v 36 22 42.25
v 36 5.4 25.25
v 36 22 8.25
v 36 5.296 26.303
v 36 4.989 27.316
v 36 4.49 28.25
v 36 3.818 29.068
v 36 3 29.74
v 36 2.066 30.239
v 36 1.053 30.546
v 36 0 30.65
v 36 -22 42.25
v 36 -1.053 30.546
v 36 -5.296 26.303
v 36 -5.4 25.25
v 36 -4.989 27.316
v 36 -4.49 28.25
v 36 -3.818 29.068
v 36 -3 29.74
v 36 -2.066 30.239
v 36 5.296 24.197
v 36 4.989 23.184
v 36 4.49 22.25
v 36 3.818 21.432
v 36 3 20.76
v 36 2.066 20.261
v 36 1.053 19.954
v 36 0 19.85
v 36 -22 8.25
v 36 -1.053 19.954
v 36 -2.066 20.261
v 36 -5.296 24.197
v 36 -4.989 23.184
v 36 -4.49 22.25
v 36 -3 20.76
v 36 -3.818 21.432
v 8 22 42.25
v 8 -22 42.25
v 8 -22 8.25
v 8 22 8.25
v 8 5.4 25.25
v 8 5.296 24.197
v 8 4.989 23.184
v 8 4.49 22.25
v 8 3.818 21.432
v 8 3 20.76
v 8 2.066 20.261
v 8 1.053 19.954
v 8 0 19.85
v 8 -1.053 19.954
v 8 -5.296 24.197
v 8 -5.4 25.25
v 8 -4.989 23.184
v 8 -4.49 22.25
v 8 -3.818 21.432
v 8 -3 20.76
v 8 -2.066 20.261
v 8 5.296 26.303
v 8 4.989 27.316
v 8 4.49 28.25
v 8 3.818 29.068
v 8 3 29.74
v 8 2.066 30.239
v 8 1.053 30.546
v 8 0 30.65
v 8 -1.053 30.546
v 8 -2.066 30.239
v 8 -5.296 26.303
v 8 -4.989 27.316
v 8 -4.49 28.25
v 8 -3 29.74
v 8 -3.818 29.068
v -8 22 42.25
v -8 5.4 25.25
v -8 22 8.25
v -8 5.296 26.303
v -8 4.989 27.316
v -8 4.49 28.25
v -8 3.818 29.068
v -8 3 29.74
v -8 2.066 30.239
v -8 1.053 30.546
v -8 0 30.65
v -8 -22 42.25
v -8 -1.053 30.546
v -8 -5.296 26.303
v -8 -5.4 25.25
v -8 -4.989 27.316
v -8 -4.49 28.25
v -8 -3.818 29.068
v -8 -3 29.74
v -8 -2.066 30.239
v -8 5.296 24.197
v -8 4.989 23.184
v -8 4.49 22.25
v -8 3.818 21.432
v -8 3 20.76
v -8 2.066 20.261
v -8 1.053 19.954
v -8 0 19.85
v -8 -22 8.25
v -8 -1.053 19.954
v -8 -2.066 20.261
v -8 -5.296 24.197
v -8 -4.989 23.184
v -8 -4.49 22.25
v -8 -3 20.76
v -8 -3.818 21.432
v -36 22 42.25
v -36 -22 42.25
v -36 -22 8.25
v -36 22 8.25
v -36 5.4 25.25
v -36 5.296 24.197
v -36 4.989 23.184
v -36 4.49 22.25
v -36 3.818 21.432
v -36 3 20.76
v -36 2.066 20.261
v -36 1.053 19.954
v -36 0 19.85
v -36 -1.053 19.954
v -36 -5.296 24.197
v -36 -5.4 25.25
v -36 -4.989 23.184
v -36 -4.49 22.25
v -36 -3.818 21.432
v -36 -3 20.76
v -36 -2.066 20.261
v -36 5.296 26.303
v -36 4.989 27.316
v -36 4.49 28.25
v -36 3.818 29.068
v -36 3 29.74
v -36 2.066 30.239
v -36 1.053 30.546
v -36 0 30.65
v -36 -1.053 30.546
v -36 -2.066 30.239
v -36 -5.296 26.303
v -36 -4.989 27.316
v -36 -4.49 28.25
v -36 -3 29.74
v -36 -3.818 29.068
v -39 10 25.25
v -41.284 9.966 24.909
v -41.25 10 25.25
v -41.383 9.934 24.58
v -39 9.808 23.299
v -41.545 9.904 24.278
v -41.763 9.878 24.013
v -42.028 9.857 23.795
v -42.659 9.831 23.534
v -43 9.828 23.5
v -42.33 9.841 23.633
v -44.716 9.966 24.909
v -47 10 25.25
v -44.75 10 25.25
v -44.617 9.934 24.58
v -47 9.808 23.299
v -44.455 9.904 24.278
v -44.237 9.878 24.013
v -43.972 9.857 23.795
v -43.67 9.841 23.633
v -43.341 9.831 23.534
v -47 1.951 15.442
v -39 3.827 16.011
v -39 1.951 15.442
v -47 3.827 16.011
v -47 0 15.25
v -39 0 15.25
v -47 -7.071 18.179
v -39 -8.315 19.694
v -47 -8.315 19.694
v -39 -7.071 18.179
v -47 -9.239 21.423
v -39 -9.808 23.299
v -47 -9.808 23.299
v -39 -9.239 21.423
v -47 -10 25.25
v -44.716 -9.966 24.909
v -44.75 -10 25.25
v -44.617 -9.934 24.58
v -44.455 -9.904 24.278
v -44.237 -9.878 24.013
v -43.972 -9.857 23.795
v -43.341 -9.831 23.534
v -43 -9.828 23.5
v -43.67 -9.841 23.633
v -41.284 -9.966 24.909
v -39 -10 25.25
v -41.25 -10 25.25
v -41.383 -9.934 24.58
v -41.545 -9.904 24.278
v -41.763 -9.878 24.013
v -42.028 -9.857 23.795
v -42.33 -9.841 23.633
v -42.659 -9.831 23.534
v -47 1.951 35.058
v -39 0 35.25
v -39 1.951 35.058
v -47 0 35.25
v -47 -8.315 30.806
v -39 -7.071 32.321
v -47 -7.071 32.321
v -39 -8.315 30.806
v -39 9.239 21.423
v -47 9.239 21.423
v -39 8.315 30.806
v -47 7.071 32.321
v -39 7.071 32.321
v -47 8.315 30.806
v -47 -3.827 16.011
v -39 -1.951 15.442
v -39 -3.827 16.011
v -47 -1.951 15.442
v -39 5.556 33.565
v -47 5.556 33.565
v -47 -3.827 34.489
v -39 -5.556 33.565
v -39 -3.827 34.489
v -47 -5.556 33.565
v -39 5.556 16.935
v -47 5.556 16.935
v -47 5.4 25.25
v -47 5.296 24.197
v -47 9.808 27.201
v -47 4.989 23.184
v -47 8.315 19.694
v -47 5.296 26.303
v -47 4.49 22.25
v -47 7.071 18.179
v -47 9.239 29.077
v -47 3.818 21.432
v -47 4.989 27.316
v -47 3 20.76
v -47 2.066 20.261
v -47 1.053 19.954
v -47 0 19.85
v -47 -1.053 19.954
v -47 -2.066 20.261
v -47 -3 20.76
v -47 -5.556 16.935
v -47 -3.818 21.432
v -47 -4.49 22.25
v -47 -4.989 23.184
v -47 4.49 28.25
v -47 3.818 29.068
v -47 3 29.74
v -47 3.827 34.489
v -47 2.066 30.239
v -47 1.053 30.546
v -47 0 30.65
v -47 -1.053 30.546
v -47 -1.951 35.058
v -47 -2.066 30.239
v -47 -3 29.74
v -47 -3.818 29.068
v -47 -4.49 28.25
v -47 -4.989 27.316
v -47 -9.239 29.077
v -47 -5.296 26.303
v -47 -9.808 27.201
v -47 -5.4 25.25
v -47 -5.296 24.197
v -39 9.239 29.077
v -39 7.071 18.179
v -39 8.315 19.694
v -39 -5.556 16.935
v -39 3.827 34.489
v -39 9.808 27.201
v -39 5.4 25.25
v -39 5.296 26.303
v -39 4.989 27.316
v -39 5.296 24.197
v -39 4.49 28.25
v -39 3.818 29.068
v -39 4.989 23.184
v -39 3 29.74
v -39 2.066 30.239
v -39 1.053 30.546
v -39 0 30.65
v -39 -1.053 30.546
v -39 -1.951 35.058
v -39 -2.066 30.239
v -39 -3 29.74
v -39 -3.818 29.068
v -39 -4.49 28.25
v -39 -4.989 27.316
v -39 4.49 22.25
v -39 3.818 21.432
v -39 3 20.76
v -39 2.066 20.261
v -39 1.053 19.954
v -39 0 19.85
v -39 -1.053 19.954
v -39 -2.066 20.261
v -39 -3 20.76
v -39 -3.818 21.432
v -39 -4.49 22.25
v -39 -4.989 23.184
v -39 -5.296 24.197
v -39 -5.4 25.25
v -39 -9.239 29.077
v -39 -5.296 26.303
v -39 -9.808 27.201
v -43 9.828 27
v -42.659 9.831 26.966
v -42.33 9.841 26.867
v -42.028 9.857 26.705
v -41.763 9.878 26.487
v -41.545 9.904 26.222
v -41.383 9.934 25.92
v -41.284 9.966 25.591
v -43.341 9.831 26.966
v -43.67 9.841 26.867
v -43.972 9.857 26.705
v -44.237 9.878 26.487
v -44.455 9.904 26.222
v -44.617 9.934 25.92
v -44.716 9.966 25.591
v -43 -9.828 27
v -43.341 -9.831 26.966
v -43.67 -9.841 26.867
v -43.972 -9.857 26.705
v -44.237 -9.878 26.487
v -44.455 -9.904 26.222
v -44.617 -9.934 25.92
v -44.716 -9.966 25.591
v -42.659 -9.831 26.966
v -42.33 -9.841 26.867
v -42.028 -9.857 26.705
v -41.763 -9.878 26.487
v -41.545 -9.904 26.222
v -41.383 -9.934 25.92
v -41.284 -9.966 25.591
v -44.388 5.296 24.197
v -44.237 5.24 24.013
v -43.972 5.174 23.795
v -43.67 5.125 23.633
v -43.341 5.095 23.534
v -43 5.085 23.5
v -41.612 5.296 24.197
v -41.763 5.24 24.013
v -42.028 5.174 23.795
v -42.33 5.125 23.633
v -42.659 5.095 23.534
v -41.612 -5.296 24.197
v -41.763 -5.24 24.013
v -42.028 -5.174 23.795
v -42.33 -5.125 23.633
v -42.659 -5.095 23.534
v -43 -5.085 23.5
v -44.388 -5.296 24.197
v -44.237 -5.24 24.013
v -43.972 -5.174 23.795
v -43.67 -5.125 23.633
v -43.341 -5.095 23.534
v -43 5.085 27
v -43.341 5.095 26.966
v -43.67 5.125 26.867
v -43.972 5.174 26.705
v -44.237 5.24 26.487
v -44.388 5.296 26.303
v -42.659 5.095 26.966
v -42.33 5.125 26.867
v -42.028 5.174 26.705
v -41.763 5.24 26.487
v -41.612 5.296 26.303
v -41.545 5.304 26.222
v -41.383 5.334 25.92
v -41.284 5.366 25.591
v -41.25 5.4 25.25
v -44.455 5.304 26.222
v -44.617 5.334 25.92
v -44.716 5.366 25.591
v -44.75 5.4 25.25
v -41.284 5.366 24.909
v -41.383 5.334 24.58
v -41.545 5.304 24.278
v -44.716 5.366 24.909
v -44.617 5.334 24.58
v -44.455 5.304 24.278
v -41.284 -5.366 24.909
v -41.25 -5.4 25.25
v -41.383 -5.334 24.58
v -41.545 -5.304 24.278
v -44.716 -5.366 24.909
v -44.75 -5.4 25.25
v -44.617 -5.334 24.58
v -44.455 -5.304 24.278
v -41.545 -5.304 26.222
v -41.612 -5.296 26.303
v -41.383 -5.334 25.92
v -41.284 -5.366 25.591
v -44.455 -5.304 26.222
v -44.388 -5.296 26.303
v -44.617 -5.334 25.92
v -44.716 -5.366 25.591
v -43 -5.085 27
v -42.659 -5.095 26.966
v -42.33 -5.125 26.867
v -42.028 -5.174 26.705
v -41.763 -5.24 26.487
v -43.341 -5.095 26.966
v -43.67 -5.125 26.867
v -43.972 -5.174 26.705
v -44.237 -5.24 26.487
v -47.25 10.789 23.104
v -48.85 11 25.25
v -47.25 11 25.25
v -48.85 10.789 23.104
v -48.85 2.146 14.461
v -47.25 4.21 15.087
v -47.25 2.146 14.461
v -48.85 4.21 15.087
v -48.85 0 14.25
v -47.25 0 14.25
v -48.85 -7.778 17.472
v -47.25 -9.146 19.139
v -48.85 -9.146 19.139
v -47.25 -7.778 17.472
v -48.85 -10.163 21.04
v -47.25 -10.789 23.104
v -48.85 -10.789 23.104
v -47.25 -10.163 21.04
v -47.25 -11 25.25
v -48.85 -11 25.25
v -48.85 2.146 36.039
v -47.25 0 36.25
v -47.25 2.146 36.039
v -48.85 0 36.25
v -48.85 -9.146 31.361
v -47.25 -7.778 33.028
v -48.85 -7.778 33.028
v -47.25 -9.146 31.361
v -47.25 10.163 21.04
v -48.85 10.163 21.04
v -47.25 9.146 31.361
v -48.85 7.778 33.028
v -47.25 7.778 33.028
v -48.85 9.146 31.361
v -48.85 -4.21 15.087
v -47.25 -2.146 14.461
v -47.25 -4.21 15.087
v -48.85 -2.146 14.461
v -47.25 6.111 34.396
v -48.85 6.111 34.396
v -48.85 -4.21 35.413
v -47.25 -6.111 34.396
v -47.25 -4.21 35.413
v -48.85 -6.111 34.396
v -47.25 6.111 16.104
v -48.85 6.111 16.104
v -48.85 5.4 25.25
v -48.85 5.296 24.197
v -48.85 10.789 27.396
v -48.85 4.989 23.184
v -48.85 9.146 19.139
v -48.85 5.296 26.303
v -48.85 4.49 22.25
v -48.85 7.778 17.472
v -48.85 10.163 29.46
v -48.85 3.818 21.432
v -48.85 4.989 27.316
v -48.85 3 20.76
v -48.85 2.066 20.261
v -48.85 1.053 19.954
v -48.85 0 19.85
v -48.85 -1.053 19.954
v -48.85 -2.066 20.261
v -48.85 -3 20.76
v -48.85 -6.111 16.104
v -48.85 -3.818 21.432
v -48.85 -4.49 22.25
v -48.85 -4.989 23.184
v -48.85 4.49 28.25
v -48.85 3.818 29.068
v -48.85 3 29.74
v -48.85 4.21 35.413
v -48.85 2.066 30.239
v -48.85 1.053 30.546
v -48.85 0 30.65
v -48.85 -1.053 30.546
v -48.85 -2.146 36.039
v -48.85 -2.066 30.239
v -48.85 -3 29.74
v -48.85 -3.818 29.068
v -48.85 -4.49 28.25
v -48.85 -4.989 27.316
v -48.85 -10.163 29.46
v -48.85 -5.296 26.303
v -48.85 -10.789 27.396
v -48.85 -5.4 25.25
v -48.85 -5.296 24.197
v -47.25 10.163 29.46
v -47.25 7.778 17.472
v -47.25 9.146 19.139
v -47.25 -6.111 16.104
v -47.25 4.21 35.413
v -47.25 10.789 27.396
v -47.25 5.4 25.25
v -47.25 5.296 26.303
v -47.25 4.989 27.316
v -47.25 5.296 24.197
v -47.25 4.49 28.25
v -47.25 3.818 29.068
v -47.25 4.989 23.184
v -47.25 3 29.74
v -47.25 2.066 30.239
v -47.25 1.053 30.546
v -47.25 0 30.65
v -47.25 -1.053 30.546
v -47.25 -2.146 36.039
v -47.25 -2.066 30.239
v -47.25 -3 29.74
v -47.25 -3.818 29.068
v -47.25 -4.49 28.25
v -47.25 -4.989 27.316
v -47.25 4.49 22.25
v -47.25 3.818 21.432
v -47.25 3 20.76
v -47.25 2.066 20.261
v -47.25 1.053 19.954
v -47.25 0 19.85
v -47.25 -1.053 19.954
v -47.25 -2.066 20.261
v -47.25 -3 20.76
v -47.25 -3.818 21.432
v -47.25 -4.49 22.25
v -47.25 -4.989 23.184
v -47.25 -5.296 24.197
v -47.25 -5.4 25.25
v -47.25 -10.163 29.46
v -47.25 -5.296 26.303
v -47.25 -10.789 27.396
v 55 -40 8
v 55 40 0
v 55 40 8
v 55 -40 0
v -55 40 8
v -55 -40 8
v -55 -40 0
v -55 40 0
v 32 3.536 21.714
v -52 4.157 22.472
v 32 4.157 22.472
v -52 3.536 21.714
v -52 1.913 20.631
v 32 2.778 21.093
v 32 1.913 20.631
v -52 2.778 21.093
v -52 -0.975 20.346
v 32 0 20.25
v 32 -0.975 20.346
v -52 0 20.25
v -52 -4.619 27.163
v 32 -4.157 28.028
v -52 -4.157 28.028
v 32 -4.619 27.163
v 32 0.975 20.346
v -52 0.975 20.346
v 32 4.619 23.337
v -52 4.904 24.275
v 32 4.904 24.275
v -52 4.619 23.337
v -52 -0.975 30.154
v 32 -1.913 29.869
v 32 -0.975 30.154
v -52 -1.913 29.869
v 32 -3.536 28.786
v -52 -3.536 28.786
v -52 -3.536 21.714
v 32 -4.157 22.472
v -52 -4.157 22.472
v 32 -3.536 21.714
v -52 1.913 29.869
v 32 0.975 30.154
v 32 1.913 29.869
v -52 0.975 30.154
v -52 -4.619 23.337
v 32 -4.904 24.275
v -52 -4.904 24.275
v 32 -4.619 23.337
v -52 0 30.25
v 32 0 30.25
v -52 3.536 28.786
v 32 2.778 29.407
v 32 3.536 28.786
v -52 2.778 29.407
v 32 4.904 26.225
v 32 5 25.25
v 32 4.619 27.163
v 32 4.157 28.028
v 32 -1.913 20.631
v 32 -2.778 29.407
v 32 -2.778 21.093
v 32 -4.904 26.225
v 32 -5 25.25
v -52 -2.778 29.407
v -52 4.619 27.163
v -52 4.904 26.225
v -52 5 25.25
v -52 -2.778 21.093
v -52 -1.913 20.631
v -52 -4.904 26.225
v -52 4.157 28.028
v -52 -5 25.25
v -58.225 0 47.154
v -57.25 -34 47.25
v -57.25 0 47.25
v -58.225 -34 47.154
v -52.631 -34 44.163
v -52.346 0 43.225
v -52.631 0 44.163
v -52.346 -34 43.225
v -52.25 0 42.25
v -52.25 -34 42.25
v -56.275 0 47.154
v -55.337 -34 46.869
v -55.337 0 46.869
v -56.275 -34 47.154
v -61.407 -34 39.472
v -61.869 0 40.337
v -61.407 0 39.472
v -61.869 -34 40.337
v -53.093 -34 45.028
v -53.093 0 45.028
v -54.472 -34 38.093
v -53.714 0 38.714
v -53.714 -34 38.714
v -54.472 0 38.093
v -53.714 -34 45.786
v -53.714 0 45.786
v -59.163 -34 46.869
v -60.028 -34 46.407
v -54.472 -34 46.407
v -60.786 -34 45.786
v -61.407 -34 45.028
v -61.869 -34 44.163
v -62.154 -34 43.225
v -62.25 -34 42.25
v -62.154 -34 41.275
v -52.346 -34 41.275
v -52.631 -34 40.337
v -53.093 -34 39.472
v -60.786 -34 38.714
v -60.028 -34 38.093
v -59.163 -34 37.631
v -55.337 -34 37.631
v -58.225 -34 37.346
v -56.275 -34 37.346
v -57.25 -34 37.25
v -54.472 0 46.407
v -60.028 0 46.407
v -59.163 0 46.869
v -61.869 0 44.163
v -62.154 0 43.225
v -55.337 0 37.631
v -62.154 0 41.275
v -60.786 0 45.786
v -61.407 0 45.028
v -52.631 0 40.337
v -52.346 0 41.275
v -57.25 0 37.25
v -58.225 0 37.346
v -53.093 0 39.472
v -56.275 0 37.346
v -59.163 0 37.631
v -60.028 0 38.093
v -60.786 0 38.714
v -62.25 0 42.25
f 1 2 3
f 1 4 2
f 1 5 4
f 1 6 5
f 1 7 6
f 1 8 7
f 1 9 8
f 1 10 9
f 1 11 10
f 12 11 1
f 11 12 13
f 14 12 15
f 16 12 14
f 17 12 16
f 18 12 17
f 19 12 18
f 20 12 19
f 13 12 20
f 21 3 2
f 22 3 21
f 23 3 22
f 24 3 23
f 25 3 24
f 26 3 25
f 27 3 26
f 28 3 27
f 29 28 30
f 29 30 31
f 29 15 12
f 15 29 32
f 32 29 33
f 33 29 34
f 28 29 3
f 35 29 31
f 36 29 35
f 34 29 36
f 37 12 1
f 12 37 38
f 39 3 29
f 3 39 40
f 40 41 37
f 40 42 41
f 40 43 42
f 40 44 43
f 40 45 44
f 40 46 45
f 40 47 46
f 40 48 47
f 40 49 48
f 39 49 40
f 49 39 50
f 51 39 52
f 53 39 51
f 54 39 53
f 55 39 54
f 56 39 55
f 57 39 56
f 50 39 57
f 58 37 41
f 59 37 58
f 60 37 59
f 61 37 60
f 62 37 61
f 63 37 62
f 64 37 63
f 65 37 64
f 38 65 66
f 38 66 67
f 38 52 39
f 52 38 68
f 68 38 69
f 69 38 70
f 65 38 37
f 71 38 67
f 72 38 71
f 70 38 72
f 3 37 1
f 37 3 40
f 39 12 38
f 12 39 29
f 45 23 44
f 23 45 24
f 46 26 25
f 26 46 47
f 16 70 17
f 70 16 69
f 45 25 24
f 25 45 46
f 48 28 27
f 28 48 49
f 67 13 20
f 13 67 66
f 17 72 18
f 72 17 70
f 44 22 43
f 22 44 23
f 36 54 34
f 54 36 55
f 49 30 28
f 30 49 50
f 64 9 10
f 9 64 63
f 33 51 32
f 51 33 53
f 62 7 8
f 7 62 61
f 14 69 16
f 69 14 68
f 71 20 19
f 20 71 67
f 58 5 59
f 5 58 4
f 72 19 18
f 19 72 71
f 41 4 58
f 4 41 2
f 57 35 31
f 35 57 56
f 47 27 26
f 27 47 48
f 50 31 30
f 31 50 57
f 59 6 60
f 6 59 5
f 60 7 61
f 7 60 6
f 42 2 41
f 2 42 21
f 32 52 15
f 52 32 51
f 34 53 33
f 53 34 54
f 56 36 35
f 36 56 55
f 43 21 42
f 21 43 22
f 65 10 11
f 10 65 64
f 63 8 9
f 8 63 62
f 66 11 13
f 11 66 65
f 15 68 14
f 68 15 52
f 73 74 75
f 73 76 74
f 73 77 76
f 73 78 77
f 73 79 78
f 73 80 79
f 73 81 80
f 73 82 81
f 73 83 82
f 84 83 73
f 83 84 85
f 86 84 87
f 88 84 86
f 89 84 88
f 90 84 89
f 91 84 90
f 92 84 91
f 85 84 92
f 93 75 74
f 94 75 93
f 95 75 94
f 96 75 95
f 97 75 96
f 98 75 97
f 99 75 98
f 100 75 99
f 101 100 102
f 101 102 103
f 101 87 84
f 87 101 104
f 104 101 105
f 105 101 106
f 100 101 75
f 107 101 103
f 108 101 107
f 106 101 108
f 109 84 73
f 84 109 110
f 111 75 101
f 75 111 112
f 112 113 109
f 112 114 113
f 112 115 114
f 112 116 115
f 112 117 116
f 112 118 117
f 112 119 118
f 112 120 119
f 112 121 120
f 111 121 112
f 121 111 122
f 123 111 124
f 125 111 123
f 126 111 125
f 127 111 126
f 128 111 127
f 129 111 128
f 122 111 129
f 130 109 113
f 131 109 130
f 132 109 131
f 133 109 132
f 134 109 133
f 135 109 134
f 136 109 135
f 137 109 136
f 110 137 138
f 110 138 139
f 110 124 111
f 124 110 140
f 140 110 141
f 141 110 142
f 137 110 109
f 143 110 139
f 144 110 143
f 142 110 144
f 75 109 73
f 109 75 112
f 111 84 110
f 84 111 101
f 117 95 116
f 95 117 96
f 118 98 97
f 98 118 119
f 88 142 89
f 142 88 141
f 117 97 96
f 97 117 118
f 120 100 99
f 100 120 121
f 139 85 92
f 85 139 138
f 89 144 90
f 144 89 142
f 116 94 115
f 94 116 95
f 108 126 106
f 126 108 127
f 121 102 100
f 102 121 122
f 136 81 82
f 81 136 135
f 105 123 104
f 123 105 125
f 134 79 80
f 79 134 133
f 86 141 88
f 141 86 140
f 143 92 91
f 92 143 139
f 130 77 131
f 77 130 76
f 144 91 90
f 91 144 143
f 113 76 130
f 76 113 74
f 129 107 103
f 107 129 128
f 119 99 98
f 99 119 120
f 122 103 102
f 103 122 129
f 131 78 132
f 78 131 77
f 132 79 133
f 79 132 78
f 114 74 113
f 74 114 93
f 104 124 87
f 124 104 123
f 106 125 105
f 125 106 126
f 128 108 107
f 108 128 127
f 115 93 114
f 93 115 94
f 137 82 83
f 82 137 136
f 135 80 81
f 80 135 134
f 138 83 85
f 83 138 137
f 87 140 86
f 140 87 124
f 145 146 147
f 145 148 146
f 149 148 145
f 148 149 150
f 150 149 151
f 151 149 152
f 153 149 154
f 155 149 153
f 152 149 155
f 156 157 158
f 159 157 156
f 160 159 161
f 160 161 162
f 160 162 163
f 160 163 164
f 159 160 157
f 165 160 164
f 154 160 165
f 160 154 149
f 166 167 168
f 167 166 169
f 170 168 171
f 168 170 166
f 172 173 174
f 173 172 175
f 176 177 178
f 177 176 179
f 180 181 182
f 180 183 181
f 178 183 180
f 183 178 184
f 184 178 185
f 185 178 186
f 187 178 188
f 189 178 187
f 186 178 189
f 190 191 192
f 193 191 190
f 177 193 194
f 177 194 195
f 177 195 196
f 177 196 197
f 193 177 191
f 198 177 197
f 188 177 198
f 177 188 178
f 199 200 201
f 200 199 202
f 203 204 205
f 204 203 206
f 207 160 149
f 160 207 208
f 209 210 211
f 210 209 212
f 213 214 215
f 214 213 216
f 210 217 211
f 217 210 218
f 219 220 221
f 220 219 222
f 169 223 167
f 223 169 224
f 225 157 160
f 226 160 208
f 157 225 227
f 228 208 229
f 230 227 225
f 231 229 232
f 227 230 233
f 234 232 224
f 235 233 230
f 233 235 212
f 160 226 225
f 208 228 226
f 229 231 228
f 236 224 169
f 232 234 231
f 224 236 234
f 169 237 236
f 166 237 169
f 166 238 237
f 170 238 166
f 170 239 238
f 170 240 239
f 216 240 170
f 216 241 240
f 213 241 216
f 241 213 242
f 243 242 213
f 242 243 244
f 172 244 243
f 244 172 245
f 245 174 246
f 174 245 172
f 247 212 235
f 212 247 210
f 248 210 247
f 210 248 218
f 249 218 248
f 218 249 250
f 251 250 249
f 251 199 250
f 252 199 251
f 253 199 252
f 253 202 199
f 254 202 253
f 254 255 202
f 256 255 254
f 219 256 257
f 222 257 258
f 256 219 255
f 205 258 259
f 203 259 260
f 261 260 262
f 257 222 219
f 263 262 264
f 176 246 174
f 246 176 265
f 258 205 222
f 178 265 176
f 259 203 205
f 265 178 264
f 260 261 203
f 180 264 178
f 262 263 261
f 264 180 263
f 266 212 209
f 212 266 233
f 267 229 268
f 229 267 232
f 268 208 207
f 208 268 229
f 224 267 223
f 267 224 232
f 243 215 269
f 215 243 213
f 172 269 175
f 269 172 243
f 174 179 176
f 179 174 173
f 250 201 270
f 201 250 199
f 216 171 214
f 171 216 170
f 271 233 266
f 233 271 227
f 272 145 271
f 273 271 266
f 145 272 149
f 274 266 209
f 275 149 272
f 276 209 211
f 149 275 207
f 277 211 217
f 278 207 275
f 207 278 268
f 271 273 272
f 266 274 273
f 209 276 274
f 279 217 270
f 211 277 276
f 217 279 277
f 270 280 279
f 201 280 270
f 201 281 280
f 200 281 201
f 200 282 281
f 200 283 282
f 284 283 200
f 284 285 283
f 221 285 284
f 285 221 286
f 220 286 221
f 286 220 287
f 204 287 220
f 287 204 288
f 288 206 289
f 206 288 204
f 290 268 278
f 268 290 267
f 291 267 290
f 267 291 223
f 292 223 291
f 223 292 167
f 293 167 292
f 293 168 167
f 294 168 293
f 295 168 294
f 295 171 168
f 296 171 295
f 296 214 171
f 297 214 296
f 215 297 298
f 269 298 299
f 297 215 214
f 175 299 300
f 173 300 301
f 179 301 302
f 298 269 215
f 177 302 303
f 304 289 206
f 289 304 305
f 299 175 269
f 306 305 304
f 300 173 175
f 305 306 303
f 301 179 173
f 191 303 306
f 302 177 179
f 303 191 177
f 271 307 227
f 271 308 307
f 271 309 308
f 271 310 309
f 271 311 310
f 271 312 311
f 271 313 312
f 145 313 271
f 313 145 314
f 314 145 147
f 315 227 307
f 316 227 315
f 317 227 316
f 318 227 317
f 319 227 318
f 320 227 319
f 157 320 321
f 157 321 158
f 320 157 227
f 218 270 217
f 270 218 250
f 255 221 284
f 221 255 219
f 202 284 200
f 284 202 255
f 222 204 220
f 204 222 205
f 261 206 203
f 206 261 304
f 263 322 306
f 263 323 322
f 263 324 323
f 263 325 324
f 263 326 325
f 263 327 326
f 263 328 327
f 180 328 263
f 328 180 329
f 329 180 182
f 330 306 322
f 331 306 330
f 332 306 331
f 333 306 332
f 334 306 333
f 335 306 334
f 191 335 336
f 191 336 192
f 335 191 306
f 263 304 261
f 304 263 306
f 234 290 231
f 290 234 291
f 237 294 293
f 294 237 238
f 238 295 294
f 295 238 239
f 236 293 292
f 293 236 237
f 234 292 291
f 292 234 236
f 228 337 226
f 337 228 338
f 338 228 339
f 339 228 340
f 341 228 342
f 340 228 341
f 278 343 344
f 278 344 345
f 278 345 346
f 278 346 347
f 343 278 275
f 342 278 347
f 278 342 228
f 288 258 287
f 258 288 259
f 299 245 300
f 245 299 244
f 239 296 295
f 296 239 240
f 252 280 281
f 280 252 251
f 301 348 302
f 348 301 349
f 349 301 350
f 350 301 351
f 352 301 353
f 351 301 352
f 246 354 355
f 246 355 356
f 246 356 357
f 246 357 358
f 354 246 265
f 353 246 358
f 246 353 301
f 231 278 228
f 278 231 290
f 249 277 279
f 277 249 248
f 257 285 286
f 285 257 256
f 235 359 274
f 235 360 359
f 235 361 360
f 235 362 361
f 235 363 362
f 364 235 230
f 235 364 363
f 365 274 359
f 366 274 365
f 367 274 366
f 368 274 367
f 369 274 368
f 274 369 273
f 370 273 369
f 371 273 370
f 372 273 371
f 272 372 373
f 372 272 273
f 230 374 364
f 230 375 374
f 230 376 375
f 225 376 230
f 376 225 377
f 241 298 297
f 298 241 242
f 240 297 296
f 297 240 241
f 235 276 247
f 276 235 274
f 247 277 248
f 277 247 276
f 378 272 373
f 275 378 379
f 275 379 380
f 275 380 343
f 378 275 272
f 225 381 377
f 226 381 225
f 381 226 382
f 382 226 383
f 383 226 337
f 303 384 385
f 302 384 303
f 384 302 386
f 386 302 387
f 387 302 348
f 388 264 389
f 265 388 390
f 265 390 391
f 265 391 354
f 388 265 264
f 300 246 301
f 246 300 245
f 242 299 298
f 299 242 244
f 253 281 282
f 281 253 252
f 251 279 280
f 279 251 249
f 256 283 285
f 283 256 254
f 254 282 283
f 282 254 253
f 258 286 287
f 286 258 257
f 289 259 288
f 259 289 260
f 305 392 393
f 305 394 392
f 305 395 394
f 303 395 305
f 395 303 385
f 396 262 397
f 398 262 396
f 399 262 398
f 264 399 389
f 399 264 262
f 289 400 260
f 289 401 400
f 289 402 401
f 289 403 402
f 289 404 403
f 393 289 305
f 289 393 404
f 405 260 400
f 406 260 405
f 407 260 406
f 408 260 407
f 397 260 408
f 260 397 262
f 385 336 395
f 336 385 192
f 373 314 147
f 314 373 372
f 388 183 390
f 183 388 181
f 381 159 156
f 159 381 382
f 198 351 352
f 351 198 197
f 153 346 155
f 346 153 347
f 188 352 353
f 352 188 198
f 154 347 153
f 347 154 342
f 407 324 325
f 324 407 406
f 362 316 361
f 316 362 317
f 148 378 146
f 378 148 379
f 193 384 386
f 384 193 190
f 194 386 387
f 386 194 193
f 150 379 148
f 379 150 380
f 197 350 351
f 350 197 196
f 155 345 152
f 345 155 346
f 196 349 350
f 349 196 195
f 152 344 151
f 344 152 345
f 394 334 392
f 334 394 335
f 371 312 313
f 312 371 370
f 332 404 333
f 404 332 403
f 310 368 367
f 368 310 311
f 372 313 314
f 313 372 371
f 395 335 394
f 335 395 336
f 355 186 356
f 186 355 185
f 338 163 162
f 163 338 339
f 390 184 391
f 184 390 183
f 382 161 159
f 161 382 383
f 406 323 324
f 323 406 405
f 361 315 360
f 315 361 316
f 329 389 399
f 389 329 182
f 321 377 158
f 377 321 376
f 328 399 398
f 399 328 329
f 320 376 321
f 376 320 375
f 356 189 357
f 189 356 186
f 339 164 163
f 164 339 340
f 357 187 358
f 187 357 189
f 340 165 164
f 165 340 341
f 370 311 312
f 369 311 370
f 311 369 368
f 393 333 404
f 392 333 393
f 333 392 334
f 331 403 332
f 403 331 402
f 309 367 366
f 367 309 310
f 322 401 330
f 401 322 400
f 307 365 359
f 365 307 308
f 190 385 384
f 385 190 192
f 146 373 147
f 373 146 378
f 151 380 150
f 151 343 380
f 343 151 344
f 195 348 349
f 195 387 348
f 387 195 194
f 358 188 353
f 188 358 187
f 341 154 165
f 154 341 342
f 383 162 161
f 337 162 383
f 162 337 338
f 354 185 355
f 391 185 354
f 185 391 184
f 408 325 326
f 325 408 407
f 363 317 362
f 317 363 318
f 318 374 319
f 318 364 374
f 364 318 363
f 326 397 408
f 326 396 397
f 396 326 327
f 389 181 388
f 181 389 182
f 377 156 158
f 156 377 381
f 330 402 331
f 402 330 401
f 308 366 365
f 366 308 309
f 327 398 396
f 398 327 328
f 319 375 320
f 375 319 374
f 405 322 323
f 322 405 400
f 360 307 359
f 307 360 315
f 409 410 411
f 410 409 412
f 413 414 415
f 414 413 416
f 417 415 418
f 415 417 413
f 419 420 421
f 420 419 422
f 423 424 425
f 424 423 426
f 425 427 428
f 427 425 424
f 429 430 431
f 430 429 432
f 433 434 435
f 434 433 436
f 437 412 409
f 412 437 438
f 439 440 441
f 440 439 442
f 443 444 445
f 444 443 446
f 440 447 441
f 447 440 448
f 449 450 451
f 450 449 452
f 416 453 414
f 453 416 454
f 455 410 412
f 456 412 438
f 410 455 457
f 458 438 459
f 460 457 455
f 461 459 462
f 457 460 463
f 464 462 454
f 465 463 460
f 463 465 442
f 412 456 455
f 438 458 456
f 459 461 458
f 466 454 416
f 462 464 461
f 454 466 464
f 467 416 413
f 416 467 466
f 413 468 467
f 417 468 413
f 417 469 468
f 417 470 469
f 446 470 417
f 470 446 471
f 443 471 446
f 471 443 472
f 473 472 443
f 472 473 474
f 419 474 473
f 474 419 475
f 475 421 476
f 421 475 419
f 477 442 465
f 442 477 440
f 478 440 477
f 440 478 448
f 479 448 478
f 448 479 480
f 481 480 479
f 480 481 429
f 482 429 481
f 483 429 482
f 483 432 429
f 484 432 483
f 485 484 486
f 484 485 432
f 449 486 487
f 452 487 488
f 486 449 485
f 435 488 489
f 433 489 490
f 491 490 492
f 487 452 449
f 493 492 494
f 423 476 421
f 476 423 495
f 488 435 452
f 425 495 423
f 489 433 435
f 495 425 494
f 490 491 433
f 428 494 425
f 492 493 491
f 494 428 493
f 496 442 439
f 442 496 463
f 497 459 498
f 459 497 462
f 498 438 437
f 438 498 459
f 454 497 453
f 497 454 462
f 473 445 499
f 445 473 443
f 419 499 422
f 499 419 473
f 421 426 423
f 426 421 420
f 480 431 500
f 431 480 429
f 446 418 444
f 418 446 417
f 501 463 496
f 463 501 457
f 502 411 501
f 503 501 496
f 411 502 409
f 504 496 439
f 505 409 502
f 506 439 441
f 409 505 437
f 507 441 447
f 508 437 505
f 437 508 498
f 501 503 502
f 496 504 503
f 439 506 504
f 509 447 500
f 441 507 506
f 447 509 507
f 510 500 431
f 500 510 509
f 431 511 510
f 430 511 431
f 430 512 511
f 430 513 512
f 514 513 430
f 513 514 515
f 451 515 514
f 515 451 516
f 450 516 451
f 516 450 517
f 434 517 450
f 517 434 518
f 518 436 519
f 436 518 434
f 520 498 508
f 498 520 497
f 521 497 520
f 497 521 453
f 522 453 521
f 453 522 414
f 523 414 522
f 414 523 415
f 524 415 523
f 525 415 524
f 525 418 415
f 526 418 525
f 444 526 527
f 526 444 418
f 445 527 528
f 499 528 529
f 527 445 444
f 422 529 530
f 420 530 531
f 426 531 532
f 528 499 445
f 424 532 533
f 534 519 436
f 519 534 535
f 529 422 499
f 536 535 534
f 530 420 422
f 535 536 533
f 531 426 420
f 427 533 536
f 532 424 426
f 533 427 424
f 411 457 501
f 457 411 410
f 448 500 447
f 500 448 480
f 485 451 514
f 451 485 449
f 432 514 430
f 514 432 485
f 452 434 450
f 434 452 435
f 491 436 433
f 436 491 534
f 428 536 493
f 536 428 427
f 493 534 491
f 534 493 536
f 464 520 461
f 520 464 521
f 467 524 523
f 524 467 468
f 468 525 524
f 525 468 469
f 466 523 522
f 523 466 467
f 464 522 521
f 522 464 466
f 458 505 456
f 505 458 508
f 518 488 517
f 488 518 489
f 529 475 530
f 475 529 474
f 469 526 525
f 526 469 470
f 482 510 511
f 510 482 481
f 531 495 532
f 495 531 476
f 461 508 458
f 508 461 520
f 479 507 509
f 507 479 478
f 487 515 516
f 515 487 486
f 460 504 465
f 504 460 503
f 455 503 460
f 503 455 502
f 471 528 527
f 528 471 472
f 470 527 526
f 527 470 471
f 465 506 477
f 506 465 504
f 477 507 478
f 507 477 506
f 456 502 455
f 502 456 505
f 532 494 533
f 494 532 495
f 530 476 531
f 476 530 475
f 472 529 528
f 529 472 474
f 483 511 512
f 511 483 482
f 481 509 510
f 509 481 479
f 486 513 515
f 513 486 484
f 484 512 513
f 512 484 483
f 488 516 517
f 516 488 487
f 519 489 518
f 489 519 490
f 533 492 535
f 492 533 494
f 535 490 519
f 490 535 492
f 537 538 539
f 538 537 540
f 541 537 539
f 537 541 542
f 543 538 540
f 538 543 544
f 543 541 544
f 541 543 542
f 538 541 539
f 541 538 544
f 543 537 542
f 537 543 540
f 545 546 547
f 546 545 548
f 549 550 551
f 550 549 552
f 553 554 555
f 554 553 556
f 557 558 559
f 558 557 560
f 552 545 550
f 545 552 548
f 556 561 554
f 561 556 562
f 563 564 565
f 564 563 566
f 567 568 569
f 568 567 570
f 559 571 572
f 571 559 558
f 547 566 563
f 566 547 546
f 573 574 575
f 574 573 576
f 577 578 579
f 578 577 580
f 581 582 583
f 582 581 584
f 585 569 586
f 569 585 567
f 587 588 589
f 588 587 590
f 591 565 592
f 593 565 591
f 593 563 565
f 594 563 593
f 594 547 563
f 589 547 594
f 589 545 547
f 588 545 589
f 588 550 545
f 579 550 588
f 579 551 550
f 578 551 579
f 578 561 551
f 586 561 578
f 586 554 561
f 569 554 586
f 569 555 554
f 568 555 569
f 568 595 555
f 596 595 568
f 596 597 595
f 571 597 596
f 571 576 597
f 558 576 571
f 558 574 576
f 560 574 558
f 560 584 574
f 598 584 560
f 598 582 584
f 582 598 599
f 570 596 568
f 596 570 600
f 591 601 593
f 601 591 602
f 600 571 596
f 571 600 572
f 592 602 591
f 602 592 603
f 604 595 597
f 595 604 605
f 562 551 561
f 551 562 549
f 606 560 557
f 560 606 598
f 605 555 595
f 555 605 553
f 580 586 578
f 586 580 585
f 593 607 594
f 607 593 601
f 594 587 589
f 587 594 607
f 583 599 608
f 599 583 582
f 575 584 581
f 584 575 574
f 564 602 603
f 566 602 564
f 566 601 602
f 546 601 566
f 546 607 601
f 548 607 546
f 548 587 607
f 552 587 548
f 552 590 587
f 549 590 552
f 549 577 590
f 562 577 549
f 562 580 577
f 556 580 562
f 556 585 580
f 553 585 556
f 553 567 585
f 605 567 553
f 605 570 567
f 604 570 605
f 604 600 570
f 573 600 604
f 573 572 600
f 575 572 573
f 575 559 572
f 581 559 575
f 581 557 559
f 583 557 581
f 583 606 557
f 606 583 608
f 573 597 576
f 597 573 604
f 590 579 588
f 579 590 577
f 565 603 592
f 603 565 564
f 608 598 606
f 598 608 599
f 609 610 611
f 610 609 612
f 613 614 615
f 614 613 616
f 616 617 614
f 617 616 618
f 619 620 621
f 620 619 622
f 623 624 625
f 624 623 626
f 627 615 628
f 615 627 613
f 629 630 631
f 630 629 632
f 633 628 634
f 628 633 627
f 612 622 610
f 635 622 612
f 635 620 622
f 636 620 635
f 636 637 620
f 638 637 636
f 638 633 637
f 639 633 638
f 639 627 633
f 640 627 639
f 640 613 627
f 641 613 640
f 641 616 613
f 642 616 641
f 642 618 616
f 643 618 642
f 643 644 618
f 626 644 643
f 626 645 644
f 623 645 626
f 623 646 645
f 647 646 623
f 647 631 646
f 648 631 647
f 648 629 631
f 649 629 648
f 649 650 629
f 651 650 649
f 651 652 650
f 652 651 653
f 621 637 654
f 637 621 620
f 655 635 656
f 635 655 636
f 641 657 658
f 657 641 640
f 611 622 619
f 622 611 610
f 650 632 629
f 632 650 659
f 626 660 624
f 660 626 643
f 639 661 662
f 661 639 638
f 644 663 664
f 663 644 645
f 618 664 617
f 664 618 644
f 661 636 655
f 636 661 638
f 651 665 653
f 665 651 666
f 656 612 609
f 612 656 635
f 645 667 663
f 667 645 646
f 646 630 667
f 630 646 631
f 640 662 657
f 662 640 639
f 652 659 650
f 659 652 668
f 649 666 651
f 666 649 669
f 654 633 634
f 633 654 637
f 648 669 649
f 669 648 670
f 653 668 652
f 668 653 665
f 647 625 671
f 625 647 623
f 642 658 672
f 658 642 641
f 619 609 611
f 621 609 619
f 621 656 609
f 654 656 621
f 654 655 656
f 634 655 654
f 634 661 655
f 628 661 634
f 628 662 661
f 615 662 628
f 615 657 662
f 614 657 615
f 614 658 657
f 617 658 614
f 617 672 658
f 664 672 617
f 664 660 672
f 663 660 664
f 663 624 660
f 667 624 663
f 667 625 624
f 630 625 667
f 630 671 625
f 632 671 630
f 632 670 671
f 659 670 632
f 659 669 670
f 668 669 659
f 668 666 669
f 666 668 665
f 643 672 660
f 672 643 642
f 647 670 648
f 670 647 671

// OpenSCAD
$fn = 32;

// ------------------------------------------------------------------------
// Machine vise: screw d10, jaws 28 x 34 mm
// Every part is its own module, assembly() places every instance.
// ------------------------------------------------------------------------

// --- part 1 ---
module vise_bed() {
  difference() {
    translate([-55, -40, 0]) cube([110, 80, 8]);
  }
}

// --- part 2 ---
module vise_jaw() {
  difference() {
    translate([-14, -22, 0]) cube([28, 44, 34]);
    translate([0, 0, 17]) rotate([0, 90, 0]) cylinder(h = 30, d = 10.8, center = true);
  }
}

// --- part 3 ---
module vise_screw() {
  translate([0, 0, -42]) cylinder(h = 84, d = 10);
}

// --- part 4 ---
module screw_collar() {
  difference() {
    cylinder(h = 8, d = 20);
    translate([0, 0, -1]) cylinder(h = 10, d = 10.8);
    translate([0, 0, 4]) rotate([90, 0, 0]) cylinder(h = 22, d = 3.5, center = true);
  }
}

// --- part 5 ---
module screw_washer() {
  difference() {
      translate([0, 0, 0]) cylinder(h = 1.6, d = 22);
      translate([0, 0, -1]) cylinder(h = 3.6, d = 10.8);
    }
}

// --- part 6 ---
module vise_handle() {
  cylinder(h = 34, d = 10);
}

// --- assembly ---
module assembly() {
  color([0.80, 0.24, 0.20]) translate([0, 0, 0]) rotate([0, 0, 0]) vise_bed();
  color([0.20, 0.45, 0.75]) translate([22, 0, 8.25]) rotate([0, 0, 0]) vise_jaw();
  color([0.25, 0.62, 0.32]) translate([-22, 0, 8.25]) rotate([0, 0, 0]) vise_jaw();
  color([0.92, 0.70, 0.18]) translate([-10, 0, 25.25]) rotate([0, 90, 0]) vise_screw();
  color([0.58, 0.35, 0.70]) translate([-47, 0, 25.25]) rotate([0, 90, 0]) screw_collar();
  color([0.16, 0.66, 0.66]) translate([-48.85, 0, 25.25]) rotate([0, 90, 0]) screw_washer();
  color([0.85, 0.48, 0.18]) translate([-57.25, 0, 42.25]) rotate([90, 0, 0]) vise_handle();
}

assembly();
